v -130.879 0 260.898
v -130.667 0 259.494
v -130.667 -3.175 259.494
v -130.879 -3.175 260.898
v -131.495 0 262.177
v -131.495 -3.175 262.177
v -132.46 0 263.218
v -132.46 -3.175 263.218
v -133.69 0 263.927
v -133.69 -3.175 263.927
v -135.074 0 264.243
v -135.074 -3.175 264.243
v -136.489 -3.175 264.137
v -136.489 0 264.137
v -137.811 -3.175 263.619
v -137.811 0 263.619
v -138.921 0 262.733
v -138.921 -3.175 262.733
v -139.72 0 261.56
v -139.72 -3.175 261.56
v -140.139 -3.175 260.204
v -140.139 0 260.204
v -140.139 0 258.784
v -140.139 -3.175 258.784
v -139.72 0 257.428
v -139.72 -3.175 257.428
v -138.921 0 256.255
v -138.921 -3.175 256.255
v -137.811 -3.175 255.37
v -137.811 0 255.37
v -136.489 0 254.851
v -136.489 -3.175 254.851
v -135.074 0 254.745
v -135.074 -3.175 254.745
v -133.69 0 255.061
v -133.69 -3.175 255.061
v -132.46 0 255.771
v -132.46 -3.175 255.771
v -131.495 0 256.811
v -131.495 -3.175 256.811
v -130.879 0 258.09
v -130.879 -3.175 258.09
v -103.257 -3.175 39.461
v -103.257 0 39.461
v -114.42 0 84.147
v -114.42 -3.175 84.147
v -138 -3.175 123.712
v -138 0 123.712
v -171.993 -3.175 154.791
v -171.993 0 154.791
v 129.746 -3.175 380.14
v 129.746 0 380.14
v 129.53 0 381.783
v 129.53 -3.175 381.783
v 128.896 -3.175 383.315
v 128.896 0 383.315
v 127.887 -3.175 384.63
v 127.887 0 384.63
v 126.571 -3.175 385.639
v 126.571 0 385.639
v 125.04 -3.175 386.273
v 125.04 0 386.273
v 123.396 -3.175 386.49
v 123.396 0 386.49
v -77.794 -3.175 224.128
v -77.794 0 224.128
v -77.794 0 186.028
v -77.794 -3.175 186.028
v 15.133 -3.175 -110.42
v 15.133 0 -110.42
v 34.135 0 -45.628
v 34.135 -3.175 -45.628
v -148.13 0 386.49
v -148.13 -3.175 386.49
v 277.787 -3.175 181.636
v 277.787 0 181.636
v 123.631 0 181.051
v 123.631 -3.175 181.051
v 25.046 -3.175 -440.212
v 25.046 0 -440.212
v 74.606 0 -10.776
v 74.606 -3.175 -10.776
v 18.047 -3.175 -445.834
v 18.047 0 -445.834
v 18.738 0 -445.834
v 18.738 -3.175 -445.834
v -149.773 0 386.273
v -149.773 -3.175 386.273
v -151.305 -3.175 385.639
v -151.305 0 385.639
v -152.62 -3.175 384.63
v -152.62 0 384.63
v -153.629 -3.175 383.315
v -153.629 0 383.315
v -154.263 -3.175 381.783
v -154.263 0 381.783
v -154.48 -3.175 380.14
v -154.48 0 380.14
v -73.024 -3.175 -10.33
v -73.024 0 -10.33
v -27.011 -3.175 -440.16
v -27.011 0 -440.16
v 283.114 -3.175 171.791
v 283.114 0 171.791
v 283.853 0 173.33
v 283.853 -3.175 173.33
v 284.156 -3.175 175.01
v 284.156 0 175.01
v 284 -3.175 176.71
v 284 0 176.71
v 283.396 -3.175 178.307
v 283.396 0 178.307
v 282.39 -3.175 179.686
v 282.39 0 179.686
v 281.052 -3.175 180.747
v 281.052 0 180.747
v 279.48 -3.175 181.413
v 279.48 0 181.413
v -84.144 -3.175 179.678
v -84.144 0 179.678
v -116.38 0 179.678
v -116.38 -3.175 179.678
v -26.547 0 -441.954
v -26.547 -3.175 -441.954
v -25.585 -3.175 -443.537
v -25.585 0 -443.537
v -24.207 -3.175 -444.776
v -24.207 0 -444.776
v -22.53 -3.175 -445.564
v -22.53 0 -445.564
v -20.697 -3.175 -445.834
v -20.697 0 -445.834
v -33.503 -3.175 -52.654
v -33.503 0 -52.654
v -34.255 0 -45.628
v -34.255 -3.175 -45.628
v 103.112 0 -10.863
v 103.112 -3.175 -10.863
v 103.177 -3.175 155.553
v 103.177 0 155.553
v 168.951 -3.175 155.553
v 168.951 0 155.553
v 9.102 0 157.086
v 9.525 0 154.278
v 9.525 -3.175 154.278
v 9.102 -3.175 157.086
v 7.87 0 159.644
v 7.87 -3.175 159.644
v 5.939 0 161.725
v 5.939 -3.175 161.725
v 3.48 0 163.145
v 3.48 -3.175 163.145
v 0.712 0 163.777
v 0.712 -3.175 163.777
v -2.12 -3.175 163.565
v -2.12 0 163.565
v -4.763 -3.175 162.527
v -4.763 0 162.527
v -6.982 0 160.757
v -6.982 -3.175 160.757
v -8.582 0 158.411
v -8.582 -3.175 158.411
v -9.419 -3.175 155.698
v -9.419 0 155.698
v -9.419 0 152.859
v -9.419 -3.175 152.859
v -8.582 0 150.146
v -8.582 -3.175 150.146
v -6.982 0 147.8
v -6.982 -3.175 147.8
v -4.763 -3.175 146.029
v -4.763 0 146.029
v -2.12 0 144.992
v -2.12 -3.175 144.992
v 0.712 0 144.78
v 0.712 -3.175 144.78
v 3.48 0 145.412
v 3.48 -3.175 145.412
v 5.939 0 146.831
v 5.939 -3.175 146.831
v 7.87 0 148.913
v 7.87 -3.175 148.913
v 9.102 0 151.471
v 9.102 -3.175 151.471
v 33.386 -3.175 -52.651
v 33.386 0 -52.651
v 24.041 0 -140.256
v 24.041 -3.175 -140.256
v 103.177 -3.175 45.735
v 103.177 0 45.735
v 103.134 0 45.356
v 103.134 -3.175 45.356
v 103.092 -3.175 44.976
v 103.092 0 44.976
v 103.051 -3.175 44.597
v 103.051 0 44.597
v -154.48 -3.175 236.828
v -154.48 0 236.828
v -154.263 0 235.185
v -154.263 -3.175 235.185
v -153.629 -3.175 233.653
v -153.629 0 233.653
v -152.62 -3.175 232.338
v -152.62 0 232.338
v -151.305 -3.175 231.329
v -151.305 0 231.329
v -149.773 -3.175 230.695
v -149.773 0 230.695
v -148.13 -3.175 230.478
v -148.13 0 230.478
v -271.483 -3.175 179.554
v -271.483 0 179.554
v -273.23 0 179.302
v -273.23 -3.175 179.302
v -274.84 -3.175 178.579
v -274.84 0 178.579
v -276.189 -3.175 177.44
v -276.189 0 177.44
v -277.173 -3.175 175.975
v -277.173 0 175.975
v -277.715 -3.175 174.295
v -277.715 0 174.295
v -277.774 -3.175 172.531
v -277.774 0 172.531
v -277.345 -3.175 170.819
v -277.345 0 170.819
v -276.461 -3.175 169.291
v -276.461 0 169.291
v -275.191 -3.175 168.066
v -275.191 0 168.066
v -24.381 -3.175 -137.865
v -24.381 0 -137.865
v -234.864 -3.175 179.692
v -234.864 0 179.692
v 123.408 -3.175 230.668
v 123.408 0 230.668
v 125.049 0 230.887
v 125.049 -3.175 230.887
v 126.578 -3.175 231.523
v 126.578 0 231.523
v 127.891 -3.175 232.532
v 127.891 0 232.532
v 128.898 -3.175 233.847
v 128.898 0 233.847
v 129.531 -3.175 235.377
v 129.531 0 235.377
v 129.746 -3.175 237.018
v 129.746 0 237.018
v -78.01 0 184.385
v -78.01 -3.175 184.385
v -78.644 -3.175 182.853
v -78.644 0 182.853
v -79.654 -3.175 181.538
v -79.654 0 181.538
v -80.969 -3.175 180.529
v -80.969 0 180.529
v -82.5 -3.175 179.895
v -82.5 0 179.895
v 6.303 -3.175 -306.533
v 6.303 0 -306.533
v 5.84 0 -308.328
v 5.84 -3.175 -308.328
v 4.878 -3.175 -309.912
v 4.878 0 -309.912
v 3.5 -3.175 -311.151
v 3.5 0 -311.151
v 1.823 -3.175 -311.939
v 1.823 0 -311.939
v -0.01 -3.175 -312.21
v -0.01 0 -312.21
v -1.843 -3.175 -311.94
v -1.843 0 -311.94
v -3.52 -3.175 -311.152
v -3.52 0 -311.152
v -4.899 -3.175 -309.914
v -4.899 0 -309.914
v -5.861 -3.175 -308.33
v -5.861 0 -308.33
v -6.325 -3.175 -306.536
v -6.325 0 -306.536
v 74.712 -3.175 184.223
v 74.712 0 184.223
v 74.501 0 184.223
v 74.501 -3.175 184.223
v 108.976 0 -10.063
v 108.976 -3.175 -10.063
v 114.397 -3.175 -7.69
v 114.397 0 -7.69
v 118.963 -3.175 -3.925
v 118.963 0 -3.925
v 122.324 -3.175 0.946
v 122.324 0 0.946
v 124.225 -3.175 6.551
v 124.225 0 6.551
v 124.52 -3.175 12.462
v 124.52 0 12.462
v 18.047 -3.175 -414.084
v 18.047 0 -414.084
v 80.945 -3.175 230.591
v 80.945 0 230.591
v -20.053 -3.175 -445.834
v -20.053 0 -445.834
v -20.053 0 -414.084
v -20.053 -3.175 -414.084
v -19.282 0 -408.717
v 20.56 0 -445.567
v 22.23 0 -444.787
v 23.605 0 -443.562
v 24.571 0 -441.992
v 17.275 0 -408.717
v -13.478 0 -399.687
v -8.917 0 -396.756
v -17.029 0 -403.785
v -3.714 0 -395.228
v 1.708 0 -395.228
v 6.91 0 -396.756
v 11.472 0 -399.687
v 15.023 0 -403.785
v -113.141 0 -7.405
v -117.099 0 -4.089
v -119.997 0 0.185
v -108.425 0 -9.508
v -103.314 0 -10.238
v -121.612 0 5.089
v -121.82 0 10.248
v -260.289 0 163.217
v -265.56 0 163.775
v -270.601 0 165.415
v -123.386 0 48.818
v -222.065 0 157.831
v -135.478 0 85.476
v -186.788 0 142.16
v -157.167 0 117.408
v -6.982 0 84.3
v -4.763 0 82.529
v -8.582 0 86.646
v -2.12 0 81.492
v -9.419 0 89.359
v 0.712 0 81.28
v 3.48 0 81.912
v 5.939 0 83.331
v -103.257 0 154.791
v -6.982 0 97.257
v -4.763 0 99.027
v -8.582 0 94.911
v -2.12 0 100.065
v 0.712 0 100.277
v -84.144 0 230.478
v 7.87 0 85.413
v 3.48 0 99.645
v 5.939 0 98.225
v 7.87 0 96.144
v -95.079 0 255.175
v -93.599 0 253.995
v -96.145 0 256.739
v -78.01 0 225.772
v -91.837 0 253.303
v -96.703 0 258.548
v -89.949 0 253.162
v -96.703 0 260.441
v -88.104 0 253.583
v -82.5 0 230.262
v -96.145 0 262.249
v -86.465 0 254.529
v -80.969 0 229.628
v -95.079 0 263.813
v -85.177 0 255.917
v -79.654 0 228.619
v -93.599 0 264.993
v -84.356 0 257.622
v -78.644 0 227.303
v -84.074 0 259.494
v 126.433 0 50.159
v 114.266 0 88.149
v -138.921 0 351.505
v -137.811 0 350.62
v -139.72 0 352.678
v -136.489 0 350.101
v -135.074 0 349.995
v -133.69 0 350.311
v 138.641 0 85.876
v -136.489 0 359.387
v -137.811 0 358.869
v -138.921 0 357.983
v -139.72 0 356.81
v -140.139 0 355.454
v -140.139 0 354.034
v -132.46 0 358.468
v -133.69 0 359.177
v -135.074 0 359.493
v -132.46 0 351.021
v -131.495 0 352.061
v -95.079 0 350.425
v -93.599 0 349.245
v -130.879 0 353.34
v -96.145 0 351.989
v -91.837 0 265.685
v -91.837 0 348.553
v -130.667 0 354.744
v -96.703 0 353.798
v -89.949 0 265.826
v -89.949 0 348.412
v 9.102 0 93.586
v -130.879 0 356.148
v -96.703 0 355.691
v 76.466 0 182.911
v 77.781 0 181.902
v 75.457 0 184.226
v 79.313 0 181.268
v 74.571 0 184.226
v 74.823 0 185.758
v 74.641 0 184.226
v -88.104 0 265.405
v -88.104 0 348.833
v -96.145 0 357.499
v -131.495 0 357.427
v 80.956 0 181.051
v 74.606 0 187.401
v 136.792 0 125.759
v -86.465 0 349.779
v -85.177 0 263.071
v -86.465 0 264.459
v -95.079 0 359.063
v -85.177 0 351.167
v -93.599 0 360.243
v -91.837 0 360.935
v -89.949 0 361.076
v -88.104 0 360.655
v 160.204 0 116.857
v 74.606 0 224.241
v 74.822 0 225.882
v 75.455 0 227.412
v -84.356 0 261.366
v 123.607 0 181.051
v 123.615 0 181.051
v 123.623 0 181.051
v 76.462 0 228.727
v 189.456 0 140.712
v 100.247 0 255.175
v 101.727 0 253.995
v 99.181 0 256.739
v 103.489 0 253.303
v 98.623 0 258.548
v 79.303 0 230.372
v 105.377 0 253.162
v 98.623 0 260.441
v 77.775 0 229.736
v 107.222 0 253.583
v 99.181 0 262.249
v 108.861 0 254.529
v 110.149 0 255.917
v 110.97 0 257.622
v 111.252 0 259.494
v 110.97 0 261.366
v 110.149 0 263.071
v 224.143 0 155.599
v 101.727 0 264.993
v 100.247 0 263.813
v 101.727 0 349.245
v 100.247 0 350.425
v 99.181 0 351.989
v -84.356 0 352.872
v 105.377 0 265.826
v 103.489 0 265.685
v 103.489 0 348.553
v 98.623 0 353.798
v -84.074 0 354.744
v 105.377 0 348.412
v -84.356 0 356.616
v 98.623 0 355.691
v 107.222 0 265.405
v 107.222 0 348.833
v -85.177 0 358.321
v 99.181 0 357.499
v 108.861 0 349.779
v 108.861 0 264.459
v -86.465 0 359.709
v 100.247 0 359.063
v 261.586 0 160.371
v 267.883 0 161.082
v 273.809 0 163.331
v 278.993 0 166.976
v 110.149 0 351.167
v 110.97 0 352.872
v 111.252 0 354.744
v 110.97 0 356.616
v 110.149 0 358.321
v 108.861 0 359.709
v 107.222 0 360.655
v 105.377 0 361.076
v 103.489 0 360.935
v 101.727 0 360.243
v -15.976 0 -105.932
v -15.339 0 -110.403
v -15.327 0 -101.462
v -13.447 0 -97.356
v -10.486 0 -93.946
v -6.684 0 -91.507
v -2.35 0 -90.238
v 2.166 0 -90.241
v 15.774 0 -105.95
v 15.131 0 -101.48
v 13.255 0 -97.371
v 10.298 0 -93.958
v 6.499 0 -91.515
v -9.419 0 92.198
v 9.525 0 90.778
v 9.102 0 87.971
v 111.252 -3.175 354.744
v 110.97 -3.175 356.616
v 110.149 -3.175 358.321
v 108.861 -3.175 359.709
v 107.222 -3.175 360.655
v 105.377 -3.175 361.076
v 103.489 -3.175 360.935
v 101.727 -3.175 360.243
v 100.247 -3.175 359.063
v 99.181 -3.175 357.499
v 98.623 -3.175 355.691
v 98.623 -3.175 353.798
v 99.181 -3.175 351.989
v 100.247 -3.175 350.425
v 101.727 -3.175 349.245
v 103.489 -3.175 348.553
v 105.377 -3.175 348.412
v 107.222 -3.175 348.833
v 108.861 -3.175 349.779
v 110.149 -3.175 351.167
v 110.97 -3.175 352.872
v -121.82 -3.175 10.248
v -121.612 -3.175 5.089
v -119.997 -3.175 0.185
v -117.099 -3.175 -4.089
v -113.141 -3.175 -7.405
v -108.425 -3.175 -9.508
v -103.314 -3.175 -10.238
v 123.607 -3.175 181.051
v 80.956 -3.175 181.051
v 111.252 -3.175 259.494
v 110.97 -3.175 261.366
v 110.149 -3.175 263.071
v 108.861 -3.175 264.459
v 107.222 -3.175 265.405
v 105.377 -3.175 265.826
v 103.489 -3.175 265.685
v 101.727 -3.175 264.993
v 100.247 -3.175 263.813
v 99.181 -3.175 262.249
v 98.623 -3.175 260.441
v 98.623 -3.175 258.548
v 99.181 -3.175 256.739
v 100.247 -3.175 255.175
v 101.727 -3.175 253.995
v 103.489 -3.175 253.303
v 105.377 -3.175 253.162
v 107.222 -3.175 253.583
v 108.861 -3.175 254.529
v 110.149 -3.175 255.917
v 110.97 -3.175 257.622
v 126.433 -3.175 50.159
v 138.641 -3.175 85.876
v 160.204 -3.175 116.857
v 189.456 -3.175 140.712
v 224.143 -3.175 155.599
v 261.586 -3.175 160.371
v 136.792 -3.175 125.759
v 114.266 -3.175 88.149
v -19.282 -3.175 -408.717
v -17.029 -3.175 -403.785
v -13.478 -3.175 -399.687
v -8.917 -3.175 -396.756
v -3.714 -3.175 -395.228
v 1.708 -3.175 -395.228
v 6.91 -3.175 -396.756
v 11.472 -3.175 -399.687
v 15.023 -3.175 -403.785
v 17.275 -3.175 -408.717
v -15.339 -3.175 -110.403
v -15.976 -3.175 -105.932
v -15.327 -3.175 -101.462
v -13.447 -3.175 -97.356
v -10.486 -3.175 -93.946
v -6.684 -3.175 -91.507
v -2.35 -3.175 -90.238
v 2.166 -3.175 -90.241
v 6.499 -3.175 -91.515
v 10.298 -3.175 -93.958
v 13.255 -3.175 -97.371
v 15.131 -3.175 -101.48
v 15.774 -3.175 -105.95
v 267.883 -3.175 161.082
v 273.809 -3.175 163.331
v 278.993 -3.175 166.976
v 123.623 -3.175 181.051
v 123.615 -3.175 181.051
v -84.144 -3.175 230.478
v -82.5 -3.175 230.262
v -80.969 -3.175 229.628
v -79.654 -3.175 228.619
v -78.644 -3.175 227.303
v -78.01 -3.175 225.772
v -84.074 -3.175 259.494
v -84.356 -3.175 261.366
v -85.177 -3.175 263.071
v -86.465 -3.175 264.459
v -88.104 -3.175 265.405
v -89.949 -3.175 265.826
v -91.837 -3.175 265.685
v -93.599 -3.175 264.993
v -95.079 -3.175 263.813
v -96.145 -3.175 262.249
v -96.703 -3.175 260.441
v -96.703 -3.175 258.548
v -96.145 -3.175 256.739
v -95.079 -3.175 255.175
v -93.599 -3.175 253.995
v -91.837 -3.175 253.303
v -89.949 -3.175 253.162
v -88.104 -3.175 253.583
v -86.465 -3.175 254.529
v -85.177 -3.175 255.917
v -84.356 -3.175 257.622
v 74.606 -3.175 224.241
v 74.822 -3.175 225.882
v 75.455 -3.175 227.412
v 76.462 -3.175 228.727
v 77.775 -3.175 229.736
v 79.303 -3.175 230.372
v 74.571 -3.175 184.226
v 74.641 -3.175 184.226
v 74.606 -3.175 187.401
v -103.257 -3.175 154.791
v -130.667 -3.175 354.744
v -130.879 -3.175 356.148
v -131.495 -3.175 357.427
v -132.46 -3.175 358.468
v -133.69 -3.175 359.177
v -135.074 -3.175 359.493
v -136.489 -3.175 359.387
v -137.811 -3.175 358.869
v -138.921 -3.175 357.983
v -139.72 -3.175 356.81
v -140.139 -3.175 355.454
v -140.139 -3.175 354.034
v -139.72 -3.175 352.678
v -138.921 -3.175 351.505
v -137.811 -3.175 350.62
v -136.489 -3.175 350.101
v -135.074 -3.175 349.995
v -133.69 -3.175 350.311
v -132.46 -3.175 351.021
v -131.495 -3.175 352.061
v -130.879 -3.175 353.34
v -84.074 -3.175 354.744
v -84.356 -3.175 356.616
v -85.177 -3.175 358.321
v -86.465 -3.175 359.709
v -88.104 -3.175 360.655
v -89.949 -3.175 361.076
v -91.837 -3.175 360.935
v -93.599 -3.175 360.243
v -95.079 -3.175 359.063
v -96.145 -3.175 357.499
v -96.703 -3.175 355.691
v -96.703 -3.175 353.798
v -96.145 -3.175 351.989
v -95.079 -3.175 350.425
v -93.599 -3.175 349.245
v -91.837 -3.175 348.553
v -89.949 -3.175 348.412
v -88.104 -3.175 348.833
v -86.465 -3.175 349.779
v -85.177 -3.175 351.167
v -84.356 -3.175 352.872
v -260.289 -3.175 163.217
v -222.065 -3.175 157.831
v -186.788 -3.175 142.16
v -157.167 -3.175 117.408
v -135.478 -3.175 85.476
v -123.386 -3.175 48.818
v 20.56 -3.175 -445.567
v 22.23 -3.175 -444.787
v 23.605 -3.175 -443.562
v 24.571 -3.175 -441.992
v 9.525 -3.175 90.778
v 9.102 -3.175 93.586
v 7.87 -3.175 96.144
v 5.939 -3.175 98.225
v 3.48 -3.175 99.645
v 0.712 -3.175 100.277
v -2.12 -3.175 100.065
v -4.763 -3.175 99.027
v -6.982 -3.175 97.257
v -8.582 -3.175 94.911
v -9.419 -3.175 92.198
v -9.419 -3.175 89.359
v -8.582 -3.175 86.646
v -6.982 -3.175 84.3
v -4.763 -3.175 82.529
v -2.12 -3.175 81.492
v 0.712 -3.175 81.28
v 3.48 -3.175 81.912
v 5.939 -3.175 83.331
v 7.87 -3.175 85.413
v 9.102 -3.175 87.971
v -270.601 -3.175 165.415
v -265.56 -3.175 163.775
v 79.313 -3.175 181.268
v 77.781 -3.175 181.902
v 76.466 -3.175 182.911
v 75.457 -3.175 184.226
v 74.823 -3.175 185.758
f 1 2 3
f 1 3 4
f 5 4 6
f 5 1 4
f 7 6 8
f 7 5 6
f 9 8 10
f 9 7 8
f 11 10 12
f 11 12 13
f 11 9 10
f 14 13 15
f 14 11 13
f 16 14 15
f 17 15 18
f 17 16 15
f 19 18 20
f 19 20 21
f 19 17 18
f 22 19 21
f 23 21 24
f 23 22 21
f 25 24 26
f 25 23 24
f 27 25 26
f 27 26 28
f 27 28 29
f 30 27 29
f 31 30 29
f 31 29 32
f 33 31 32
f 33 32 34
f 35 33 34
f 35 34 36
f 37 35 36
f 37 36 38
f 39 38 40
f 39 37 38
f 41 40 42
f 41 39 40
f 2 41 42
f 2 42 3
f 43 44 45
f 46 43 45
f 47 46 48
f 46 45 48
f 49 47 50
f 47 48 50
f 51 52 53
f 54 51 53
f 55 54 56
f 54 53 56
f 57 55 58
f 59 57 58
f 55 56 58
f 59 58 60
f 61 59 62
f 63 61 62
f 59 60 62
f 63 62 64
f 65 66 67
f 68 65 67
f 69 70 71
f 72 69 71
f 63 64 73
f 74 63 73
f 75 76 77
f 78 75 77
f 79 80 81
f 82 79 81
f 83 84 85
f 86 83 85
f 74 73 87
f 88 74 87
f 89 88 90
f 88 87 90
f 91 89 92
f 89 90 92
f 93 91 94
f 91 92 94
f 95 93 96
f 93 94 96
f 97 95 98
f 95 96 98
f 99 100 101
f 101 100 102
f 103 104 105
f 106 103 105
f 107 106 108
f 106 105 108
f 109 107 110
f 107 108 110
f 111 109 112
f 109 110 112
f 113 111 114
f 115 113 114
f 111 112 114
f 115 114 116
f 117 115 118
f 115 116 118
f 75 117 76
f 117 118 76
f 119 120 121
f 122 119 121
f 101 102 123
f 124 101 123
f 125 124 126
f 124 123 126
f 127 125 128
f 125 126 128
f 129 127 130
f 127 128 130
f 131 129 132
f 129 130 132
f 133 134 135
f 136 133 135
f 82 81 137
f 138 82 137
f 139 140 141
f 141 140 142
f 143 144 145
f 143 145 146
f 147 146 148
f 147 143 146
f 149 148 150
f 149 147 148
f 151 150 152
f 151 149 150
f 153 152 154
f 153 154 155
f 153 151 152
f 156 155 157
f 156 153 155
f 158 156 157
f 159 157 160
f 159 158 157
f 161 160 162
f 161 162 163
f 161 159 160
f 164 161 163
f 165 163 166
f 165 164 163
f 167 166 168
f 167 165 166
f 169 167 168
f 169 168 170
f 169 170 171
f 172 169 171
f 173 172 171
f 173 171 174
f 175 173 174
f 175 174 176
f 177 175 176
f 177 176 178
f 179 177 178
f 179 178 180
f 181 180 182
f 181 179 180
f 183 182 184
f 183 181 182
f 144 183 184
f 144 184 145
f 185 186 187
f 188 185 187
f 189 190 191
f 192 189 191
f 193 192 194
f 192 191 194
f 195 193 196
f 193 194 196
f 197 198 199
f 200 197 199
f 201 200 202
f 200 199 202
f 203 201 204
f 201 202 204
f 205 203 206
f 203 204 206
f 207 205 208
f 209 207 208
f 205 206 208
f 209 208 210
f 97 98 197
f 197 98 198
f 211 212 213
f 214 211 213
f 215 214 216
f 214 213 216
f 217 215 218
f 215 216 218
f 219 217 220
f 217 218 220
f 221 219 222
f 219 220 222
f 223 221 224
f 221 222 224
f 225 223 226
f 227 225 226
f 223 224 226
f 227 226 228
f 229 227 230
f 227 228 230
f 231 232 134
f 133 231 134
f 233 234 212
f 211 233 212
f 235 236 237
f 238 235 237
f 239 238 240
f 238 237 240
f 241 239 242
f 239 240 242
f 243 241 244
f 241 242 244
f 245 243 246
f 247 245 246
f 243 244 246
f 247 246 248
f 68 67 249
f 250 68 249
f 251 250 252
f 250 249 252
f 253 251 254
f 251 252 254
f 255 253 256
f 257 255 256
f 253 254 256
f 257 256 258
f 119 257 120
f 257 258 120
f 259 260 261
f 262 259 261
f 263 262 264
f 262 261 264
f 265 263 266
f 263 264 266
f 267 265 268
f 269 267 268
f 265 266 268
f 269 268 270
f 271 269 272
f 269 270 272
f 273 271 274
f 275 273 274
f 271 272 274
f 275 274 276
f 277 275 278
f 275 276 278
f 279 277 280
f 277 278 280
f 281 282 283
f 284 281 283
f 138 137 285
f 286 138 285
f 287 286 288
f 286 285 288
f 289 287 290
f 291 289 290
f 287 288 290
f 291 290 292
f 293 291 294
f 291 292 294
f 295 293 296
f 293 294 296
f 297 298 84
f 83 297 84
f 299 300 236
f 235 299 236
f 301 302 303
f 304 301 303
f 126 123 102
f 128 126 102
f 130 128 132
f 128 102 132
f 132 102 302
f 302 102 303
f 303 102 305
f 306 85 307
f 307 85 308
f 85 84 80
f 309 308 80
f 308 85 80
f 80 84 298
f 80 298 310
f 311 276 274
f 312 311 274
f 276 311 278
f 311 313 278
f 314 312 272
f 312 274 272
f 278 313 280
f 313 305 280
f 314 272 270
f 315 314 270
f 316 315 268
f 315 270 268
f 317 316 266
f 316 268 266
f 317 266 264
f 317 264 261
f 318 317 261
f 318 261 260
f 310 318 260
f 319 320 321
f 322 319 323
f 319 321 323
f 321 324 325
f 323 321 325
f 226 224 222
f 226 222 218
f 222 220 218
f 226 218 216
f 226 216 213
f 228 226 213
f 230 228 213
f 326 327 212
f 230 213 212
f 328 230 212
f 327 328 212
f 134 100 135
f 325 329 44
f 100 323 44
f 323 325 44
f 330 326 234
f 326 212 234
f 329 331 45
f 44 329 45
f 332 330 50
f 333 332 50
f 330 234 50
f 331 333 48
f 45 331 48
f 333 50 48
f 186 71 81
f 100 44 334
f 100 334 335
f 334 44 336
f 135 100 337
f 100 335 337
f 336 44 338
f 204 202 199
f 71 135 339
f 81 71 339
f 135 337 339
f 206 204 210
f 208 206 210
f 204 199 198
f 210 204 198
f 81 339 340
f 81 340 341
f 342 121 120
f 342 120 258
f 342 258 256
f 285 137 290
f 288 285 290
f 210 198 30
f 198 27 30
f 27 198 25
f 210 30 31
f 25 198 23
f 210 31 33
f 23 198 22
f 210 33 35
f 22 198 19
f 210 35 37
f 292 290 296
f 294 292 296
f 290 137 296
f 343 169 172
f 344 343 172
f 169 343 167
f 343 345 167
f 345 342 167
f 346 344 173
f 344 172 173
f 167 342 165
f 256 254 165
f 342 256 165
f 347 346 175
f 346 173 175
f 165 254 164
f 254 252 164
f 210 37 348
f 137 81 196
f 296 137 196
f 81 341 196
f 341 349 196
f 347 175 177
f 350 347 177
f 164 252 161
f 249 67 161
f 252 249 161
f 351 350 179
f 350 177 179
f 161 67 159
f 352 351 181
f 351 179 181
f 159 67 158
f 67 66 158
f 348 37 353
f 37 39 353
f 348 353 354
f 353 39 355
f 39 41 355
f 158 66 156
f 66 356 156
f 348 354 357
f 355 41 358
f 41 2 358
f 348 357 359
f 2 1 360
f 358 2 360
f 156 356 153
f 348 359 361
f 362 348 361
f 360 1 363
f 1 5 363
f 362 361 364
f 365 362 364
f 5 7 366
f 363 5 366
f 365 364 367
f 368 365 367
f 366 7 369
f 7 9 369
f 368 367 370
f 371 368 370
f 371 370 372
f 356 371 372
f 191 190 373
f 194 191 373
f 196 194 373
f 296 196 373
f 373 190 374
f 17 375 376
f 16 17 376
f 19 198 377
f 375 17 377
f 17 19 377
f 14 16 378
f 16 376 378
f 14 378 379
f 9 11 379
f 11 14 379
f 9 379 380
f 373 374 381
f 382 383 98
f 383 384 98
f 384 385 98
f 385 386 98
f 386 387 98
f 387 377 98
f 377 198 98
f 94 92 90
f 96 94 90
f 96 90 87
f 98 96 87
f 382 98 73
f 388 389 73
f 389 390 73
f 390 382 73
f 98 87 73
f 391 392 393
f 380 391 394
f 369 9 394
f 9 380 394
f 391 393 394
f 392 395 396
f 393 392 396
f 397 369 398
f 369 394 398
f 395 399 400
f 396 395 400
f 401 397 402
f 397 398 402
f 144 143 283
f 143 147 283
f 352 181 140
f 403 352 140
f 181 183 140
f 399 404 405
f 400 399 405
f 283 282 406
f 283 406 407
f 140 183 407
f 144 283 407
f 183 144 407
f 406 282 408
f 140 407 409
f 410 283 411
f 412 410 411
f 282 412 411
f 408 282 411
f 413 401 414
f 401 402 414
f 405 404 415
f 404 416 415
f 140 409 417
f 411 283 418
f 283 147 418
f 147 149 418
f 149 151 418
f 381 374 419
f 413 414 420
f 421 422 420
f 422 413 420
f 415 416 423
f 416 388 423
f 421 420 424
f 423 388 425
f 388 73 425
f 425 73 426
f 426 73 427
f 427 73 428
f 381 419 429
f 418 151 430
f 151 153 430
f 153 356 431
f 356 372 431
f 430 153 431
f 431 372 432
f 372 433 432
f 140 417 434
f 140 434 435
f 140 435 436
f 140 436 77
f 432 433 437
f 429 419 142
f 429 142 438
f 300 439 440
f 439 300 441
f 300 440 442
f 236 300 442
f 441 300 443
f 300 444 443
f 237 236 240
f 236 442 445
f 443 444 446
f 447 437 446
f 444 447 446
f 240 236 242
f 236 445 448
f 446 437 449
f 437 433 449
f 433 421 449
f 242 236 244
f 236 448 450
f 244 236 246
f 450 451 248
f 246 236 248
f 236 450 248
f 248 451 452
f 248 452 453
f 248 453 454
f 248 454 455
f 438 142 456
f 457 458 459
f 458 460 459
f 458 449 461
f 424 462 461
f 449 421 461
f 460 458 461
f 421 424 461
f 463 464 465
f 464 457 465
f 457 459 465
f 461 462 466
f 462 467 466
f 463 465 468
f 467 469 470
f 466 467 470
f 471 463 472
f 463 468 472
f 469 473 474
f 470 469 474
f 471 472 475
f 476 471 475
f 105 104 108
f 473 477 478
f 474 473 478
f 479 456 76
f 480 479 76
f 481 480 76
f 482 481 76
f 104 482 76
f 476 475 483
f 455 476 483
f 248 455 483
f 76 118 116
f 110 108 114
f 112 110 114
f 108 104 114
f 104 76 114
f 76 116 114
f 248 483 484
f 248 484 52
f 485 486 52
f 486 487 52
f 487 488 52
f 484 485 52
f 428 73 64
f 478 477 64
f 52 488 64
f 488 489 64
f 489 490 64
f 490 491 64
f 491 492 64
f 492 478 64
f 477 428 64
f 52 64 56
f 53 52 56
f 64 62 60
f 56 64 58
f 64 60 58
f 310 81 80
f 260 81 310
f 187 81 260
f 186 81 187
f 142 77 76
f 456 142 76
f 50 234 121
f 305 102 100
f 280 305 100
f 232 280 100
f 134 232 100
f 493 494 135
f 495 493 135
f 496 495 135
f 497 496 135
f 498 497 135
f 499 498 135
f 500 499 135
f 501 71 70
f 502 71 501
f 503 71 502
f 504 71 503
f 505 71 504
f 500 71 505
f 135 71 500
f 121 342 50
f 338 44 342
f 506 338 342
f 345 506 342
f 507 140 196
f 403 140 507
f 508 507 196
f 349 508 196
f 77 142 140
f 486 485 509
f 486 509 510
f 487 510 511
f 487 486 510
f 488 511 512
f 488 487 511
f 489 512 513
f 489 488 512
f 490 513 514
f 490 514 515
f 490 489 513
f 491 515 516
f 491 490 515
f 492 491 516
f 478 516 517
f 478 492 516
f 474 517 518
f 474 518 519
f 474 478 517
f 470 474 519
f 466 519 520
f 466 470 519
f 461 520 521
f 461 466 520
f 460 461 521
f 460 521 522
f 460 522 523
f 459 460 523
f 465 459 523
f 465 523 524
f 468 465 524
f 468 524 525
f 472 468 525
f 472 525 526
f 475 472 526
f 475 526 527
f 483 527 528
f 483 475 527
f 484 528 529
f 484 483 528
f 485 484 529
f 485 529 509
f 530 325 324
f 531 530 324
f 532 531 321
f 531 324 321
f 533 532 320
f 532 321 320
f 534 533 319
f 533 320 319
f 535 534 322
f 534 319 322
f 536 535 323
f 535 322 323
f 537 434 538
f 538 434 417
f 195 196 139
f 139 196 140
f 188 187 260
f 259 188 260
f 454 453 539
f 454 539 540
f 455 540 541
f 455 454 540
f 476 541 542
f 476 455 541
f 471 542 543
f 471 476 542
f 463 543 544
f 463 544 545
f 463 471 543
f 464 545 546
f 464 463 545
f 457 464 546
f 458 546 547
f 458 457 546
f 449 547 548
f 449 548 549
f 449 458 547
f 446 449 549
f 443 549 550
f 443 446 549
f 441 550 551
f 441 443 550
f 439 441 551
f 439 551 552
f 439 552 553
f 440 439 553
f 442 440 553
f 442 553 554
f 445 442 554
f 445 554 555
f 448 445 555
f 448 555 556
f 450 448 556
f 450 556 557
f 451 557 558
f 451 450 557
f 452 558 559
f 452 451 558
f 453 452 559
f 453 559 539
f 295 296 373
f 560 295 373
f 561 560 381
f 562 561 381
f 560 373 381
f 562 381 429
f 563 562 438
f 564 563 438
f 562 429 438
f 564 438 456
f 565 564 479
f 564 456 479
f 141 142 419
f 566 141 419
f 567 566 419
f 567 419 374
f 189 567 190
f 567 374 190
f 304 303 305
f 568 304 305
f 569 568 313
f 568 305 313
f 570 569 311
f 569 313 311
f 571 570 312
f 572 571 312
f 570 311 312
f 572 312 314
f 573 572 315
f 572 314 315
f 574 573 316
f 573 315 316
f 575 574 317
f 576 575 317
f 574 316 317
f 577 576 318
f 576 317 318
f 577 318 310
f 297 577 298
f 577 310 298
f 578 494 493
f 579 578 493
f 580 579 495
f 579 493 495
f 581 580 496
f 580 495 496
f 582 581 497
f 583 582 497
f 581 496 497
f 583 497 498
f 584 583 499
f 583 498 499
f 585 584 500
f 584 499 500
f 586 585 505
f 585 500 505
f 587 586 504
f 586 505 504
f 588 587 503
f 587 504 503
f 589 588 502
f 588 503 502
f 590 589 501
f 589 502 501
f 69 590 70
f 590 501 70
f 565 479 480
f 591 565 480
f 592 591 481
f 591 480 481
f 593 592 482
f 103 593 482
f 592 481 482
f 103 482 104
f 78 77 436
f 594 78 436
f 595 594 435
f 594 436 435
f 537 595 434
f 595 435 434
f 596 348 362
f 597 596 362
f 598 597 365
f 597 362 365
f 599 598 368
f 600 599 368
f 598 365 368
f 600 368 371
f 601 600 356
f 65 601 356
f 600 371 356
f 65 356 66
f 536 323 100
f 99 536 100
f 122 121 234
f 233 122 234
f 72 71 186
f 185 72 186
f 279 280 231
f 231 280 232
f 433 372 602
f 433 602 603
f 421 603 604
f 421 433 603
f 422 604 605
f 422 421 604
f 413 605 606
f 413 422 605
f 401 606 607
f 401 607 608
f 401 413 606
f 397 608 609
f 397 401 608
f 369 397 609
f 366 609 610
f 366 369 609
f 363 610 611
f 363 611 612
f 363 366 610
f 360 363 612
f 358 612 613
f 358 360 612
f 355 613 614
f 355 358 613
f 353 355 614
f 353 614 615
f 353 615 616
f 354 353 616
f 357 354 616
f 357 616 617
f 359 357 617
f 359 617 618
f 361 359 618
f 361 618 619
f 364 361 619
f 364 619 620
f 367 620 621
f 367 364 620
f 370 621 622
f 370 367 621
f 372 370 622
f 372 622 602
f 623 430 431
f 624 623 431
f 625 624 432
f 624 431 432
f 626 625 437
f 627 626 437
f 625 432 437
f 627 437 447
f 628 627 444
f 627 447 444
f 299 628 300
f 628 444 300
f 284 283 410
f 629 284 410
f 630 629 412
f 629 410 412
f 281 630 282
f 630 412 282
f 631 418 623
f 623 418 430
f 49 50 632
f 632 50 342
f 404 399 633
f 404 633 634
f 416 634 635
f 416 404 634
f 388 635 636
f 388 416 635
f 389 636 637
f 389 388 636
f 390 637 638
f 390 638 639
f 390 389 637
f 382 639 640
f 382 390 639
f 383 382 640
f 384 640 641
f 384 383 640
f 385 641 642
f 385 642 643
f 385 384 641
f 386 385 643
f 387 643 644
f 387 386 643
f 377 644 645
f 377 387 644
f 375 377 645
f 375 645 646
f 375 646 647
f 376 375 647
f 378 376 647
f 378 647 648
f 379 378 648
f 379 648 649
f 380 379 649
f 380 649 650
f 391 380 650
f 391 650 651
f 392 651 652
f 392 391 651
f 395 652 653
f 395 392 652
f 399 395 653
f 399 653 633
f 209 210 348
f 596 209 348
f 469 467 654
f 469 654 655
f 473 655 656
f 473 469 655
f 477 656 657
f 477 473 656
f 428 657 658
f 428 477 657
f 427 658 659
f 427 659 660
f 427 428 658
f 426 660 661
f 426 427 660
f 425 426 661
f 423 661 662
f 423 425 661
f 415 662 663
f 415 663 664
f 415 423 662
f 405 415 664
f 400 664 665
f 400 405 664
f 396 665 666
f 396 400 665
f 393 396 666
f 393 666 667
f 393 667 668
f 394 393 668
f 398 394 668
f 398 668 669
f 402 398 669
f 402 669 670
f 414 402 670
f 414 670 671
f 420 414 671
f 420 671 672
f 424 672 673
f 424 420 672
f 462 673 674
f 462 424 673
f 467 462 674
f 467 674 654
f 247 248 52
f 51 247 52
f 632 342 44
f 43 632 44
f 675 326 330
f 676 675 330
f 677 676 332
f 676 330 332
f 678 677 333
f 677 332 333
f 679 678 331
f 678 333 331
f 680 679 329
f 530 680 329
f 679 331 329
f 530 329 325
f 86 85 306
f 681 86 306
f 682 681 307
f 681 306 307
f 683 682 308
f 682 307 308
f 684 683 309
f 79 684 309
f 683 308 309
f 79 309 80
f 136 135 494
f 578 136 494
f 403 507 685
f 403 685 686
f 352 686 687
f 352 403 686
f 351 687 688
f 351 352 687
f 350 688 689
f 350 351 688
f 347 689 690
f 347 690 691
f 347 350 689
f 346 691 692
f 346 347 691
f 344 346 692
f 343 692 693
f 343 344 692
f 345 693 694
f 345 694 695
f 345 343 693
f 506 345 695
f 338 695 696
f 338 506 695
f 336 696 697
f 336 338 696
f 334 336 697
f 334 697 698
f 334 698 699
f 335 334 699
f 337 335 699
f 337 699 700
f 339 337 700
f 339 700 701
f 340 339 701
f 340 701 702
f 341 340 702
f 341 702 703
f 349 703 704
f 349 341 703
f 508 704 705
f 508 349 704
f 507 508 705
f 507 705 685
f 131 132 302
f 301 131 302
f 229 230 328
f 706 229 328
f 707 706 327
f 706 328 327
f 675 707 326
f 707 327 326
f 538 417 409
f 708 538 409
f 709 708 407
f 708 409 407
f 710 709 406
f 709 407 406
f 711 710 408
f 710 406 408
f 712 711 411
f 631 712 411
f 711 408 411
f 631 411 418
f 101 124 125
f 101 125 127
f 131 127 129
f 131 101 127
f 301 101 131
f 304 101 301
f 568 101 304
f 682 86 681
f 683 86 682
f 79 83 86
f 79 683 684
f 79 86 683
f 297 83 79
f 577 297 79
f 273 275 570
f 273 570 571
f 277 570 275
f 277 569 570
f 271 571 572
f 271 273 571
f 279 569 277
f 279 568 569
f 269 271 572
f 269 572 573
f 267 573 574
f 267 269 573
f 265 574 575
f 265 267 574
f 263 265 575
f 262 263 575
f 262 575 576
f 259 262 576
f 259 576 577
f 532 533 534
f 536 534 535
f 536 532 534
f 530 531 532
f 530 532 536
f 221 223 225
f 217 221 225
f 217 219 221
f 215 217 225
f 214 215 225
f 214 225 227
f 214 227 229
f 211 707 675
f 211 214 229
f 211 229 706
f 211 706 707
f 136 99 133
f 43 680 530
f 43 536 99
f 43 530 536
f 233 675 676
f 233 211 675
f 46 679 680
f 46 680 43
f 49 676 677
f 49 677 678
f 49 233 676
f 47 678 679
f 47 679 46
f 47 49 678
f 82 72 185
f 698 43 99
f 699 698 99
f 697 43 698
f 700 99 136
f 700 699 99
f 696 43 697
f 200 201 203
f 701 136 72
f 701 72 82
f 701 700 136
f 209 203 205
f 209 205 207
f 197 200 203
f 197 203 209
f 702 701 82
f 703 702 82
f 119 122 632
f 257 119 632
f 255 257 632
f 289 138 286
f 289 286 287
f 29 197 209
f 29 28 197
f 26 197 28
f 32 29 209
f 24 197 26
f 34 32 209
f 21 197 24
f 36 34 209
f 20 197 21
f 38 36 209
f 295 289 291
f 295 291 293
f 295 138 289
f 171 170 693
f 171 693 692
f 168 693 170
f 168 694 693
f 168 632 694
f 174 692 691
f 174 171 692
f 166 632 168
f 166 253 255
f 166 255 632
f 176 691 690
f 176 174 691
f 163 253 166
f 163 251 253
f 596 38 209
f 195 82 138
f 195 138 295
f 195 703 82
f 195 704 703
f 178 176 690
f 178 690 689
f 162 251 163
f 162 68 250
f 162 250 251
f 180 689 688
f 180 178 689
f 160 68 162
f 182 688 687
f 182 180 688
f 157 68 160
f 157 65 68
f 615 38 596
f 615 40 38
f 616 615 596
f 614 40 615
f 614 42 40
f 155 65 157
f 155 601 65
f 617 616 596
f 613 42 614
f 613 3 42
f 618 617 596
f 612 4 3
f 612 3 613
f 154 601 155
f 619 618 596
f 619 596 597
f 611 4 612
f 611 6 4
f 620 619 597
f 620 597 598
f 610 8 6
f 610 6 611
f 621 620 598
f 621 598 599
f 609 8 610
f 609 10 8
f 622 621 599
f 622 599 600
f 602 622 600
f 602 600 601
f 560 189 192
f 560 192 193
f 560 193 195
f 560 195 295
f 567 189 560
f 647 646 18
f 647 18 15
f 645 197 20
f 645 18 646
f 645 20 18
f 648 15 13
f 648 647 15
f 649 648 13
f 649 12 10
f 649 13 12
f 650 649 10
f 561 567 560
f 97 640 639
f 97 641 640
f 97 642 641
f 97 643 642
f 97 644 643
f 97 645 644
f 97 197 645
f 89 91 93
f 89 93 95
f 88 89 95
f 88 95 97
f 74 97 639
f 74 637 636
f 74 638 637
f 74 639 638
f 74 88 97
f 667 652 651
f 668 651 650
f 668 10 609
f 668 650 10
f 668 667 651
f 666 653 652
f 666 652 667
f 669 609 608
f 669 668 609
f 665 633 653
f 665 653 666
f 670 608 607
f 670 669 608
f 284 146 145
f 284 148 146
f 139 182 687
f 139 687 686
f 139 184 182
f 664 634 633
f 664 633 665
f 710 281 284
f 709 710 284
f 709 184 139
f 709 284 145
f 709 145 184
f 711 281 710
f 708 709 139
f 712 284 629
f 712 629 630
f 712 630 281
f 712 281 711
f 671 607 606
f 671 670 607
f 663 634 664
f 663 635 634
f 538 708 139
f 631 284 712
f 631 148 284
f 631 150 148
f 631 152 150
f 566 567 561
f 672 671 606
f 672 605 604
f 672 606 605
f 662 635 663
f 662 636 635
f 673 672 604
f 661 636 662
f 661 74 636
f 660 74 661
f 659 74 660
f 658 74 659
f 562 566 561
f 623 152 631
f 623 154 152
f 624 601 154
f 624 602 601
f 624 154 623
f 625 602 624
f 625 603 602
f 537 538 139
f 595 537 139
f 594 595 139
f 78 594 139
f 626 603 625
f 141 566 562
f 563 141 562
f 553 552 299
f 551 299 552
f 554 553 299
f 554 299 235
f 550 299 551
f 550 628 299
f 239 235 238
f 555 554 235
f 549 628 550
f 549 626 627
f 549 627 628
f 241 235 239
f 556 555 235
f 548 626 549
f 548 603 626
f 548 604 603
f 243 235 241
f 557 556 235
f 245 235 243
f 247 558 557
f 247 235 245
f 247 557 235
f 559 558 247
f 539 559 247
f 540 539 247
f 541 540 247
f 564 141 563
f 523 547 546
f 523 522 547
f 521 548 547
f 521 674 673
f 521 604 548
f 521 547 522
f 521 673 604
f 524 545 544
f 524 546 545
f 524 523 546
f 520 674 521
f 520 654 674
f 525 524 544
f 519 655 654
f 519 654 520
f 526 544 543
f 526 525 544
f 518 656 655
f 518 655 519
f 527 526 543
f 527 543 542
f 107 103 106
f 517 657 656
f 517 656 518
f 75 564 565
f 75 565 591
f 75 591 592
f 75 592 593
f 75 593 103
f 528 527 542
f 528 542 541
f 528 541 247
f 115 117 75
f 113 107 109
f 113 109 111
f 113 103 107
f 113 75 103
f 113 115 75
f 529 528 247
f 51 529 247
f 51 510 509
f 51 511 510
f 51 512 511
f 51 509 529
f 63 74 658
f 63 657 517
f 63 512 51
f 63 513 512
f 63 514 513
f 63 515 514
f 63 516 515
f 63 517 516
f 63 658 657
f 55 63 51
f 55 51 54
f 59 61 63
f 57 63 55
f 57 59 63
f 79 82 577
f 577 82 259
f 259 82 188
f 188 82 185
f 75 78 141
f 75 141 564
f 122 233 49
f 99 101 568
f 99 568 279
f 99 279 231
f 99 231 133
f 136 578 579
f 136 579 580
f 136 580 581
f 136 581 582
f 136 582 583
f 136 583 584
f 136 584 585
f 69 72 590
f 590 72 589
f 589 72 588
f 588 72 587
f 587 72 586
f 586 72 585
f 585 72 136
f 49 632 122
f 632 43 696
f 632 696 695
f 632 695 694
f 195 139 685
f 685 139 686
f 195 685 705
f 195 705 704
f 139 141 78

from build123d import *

# Parameters (mm, degrees)
F0_R     = 9.525
F0_R_2   = 4.7625
F0_R_3   = 6.35
F1_DEPTH = 3.175


with BuildPart() as f1:
    # F0 (on Front) → F1 (new body)
    with BuildSketch(Plane.XZ):
        with BuildLine():
            Line((25.045655, -440.212115), (74.606246, -10.776475))
            Line((74.606246, -10.776475), (-73.023894, -10.329813))
            Line((-73.023894, -10.329813), (-27.010583, -440.160007))
            ThreePointArc((-27.010583, -440.160007), (-24.941095, -444.207157), (-20.696658, -445.834102))
            Line((-20.696658, -445.834102), (-20.053171, -445.834102))
            Line((-20.053171, -445.834102), (-20.053171, -414.084102))
            ThreePointArc((-20.053171, -414.084102), (-1.003171, -395.034102), (18.046829, -414.084102))
            Line((18.046829, -414.084102), (18.046829, -445.834102))
            Line((18.046829, -445.834102), (18.737525, -445.834102))
            ThreePointArc((18.737525, -445.834102), (22.962429, -444.224639), (25.045655, -440.212115))
        make_face()
        with BuildLine():
            Line((-6.32504, -306.535779), (-24.381244, -137.864985))
            Line((-24.381244, -137.864985), (-33.503104, -52.653751))
            Line((-33.503104, -52.653751), (-34.255227, -45.627845))
            Line((-34.255227, -45.627845), (-15.339314, -110.402874))
            ThreePointArc((-15.339314, -110.402874), (-0.09162, -90.077848), (15.132605, -110.420459))
            Line((15.132605, -110.420459), (34.13484, -45.627845))
            Line((34.13484, -45.627845), (33.38561, -52.651402))
            Line((33.38561, -52.651402), (24.04055, -140.255525))
            Line((24.04055, -140.255525), (6.303062, -306.533431))
            ThreePointArc((6.303062, -306.533431), (-0.009934, -312.209874), (-6.32504, -306.535779))
        make_face(mode=Mode.SUBTRACT)
        with BuildLine():
            ThreePointArc((283.113571, 171.791383), (283.396441, 178.307404), (277.787406, 181.635659))
            Line((277.787406, 181.635659), (123.630658, 181.051308))
            ThreePointArc((123.630658, 181.051308), (123.618623, 181.051274), (123.606587, 181.051262))
            Line((123.606587, 181.051262), (80.956246, 181.051262))
            ThreePointArc((80.956246, 181.051262), (76.466118, 182.911134), (74.606246, 187.401262))
            Line((74.606246, 187.401262), (74.606246, 224.240675))
            ThreePointArc((74.606246, 224.240675), (76.46202, 228.726701), (80.94465, 230.590665))
            Line((80.94465, 230.590665), (123.407974, 230.668213))
            ThreePointArc((123.407974, 230.668213), (127.890604, 232.532177), (129.746377, 237.018203))
            Line((129.746377, 237.018203), (129.746377, 332.519098))
            Line((129.746377, 332.519098), (129.746377, 380.139775))
            ThreePointArc((129.746377, 380.139775), (127.886505, 384.629903), (123.396377, 386.489775))
            Line((123.396377, 386.489775), (-110.029623, 386.489775))
            Line((-110.029623, 386.489775), (-148.129623, 386.489775))
            ThreePointArc((-148.129623, 386.489775), (-152.619751, 384.629903), (-154.479623, 380.139775))
            Line((-154.479623, 380.139775), (-154.479623, 236.828389))
            ThreePointArc((-154.479623, 236.828389), (-152.619751, 232.338261), (-148.129623, 230.478389))
            Line((-148.129623, 230.478389), (-110.029623, 230.478389))
            Line((-110.029623, 230.478389), (-84.143754, 230.478389))
            ThreePointArc((-84.143754, 230.478389), (-79.653625, 228.618517), (-77.793754, 224.128389))
            Line((-77.793754, 224.128389), (-77.793754, 186.028389))
            ThreePointArc((-77.793754, 186.028389), (-79.653625, 181.538261), (-84.143754, 179.678389))
            Line((-84.143754, 179.678389), (-116.379623, 179.678389))
            Line((-116.379623, 179.678389), (-234.864242, 179.692387))
            Line((-234.864242, 179.692387), (-271.483406, 179.553577))
            ThreePointArc((-271.483406, 179.553577), (-277.502393, 175.153997), (-275.191033, 168.065829))
            ThreePointArc((-275.191033, 168.065829), (-268.123306, 164.463433), (-260.288993, 163.217018))
            ThreePointArc((-260.288993, 163.217018), (-157.167464, 117.40772), (-121.820214, 10.24843))
            ThreePointArc((-121.820214, 10.24843), (-117.099081, -4.08894), (-103.313719, -10.238169))
            Line((-103.313719, -10.238169), (-73.023894, -10.329813))
            Line((-73.023894, -10.329813), (74.606246, -10.776475))
            Line((74.606246, -10.776475), (103.112156, -10.862721))
            ThreePointArc((103.112156, -10.862721), (118.963009, -3.924558), (124.520268, 12.461549))
            ThreePointArc((124.520268, 12.461549), (160.203696, 116.857109), (261.585693, 160.370679))
            ThreePointArc((261.585693, 160.370679), (273.808739, 163.330633), (283.113571, 171.791383))
        make_face()
        with BuildLine():
            Line((-103.257282, 154.791078), (-103.257282, 39.461342))
            ThreePointArc((-103.257282, 39.461342), (-124.759996, 104.793935), (-171.993459, 154.791078))
            Line((-171.993459, 154.791078), (-103.257282, 154.791078))
        make_face(mode=Mode.SUBTRACT)
        with Locations((0, 90.778389)):
            Circle(F0_R, mode=Mode.SUBTRACT)
        with Locations((0, 154.278389)):
            Circle(F0_R, mode=Mode.SUBTRACT)
        with Locations((-135.429623, 259.494098)):
            Circle(F0_R_2, mode=Mode.SUBTRACT)
        with Locations((-90.424, 259.494098)):
            Circle(F0_R_3, mode=Mode.SUBTRACT)
        with Locations((-135.429623, 354.744098)):
            Circle(F0_R_2, mode=Mode.SUBTRACT)
        with Locations((-90.424, 354.744098)):
            Circle(F0_R_3, mode=Mode.SUBTRACT)
        with BuildLine():
            Line((103.051167, 44.596632), (103.176985, 155.552762))
            Line((103.176985, 155.552762), (168.951373, 155.552762))
            ThreePointArc((168.951373, 155.552762), (124.191688, 107.754936), (103.176985, 45.73523))
            ThreePointArc((103.176985, 45.73523), (103.113024, 45.166047), (103.051167, 44.596632))
        make_face(mode=Mode.SUBTRACT)
        with BuildLine():
            ThreePointArc((74.500873, 184.222761), (74.606246, 184.226262), (74.71162, 184.222761))
            Line((74.71162, 184.222761), (74.500873, 184.222761))
        make_face(mode=Mode.SUBTRACT)
        with Locations((104.902, 259.494098)):
            Circle(F0_R_3, mode=Mode.SUBTRACT)
        with Locations((104.902, 354.744098)):
            Circle(F0_R_3, mode=Mode.SUBTRACT)
    extrude(amount=F1_DEPTH)


solid = f1.part
